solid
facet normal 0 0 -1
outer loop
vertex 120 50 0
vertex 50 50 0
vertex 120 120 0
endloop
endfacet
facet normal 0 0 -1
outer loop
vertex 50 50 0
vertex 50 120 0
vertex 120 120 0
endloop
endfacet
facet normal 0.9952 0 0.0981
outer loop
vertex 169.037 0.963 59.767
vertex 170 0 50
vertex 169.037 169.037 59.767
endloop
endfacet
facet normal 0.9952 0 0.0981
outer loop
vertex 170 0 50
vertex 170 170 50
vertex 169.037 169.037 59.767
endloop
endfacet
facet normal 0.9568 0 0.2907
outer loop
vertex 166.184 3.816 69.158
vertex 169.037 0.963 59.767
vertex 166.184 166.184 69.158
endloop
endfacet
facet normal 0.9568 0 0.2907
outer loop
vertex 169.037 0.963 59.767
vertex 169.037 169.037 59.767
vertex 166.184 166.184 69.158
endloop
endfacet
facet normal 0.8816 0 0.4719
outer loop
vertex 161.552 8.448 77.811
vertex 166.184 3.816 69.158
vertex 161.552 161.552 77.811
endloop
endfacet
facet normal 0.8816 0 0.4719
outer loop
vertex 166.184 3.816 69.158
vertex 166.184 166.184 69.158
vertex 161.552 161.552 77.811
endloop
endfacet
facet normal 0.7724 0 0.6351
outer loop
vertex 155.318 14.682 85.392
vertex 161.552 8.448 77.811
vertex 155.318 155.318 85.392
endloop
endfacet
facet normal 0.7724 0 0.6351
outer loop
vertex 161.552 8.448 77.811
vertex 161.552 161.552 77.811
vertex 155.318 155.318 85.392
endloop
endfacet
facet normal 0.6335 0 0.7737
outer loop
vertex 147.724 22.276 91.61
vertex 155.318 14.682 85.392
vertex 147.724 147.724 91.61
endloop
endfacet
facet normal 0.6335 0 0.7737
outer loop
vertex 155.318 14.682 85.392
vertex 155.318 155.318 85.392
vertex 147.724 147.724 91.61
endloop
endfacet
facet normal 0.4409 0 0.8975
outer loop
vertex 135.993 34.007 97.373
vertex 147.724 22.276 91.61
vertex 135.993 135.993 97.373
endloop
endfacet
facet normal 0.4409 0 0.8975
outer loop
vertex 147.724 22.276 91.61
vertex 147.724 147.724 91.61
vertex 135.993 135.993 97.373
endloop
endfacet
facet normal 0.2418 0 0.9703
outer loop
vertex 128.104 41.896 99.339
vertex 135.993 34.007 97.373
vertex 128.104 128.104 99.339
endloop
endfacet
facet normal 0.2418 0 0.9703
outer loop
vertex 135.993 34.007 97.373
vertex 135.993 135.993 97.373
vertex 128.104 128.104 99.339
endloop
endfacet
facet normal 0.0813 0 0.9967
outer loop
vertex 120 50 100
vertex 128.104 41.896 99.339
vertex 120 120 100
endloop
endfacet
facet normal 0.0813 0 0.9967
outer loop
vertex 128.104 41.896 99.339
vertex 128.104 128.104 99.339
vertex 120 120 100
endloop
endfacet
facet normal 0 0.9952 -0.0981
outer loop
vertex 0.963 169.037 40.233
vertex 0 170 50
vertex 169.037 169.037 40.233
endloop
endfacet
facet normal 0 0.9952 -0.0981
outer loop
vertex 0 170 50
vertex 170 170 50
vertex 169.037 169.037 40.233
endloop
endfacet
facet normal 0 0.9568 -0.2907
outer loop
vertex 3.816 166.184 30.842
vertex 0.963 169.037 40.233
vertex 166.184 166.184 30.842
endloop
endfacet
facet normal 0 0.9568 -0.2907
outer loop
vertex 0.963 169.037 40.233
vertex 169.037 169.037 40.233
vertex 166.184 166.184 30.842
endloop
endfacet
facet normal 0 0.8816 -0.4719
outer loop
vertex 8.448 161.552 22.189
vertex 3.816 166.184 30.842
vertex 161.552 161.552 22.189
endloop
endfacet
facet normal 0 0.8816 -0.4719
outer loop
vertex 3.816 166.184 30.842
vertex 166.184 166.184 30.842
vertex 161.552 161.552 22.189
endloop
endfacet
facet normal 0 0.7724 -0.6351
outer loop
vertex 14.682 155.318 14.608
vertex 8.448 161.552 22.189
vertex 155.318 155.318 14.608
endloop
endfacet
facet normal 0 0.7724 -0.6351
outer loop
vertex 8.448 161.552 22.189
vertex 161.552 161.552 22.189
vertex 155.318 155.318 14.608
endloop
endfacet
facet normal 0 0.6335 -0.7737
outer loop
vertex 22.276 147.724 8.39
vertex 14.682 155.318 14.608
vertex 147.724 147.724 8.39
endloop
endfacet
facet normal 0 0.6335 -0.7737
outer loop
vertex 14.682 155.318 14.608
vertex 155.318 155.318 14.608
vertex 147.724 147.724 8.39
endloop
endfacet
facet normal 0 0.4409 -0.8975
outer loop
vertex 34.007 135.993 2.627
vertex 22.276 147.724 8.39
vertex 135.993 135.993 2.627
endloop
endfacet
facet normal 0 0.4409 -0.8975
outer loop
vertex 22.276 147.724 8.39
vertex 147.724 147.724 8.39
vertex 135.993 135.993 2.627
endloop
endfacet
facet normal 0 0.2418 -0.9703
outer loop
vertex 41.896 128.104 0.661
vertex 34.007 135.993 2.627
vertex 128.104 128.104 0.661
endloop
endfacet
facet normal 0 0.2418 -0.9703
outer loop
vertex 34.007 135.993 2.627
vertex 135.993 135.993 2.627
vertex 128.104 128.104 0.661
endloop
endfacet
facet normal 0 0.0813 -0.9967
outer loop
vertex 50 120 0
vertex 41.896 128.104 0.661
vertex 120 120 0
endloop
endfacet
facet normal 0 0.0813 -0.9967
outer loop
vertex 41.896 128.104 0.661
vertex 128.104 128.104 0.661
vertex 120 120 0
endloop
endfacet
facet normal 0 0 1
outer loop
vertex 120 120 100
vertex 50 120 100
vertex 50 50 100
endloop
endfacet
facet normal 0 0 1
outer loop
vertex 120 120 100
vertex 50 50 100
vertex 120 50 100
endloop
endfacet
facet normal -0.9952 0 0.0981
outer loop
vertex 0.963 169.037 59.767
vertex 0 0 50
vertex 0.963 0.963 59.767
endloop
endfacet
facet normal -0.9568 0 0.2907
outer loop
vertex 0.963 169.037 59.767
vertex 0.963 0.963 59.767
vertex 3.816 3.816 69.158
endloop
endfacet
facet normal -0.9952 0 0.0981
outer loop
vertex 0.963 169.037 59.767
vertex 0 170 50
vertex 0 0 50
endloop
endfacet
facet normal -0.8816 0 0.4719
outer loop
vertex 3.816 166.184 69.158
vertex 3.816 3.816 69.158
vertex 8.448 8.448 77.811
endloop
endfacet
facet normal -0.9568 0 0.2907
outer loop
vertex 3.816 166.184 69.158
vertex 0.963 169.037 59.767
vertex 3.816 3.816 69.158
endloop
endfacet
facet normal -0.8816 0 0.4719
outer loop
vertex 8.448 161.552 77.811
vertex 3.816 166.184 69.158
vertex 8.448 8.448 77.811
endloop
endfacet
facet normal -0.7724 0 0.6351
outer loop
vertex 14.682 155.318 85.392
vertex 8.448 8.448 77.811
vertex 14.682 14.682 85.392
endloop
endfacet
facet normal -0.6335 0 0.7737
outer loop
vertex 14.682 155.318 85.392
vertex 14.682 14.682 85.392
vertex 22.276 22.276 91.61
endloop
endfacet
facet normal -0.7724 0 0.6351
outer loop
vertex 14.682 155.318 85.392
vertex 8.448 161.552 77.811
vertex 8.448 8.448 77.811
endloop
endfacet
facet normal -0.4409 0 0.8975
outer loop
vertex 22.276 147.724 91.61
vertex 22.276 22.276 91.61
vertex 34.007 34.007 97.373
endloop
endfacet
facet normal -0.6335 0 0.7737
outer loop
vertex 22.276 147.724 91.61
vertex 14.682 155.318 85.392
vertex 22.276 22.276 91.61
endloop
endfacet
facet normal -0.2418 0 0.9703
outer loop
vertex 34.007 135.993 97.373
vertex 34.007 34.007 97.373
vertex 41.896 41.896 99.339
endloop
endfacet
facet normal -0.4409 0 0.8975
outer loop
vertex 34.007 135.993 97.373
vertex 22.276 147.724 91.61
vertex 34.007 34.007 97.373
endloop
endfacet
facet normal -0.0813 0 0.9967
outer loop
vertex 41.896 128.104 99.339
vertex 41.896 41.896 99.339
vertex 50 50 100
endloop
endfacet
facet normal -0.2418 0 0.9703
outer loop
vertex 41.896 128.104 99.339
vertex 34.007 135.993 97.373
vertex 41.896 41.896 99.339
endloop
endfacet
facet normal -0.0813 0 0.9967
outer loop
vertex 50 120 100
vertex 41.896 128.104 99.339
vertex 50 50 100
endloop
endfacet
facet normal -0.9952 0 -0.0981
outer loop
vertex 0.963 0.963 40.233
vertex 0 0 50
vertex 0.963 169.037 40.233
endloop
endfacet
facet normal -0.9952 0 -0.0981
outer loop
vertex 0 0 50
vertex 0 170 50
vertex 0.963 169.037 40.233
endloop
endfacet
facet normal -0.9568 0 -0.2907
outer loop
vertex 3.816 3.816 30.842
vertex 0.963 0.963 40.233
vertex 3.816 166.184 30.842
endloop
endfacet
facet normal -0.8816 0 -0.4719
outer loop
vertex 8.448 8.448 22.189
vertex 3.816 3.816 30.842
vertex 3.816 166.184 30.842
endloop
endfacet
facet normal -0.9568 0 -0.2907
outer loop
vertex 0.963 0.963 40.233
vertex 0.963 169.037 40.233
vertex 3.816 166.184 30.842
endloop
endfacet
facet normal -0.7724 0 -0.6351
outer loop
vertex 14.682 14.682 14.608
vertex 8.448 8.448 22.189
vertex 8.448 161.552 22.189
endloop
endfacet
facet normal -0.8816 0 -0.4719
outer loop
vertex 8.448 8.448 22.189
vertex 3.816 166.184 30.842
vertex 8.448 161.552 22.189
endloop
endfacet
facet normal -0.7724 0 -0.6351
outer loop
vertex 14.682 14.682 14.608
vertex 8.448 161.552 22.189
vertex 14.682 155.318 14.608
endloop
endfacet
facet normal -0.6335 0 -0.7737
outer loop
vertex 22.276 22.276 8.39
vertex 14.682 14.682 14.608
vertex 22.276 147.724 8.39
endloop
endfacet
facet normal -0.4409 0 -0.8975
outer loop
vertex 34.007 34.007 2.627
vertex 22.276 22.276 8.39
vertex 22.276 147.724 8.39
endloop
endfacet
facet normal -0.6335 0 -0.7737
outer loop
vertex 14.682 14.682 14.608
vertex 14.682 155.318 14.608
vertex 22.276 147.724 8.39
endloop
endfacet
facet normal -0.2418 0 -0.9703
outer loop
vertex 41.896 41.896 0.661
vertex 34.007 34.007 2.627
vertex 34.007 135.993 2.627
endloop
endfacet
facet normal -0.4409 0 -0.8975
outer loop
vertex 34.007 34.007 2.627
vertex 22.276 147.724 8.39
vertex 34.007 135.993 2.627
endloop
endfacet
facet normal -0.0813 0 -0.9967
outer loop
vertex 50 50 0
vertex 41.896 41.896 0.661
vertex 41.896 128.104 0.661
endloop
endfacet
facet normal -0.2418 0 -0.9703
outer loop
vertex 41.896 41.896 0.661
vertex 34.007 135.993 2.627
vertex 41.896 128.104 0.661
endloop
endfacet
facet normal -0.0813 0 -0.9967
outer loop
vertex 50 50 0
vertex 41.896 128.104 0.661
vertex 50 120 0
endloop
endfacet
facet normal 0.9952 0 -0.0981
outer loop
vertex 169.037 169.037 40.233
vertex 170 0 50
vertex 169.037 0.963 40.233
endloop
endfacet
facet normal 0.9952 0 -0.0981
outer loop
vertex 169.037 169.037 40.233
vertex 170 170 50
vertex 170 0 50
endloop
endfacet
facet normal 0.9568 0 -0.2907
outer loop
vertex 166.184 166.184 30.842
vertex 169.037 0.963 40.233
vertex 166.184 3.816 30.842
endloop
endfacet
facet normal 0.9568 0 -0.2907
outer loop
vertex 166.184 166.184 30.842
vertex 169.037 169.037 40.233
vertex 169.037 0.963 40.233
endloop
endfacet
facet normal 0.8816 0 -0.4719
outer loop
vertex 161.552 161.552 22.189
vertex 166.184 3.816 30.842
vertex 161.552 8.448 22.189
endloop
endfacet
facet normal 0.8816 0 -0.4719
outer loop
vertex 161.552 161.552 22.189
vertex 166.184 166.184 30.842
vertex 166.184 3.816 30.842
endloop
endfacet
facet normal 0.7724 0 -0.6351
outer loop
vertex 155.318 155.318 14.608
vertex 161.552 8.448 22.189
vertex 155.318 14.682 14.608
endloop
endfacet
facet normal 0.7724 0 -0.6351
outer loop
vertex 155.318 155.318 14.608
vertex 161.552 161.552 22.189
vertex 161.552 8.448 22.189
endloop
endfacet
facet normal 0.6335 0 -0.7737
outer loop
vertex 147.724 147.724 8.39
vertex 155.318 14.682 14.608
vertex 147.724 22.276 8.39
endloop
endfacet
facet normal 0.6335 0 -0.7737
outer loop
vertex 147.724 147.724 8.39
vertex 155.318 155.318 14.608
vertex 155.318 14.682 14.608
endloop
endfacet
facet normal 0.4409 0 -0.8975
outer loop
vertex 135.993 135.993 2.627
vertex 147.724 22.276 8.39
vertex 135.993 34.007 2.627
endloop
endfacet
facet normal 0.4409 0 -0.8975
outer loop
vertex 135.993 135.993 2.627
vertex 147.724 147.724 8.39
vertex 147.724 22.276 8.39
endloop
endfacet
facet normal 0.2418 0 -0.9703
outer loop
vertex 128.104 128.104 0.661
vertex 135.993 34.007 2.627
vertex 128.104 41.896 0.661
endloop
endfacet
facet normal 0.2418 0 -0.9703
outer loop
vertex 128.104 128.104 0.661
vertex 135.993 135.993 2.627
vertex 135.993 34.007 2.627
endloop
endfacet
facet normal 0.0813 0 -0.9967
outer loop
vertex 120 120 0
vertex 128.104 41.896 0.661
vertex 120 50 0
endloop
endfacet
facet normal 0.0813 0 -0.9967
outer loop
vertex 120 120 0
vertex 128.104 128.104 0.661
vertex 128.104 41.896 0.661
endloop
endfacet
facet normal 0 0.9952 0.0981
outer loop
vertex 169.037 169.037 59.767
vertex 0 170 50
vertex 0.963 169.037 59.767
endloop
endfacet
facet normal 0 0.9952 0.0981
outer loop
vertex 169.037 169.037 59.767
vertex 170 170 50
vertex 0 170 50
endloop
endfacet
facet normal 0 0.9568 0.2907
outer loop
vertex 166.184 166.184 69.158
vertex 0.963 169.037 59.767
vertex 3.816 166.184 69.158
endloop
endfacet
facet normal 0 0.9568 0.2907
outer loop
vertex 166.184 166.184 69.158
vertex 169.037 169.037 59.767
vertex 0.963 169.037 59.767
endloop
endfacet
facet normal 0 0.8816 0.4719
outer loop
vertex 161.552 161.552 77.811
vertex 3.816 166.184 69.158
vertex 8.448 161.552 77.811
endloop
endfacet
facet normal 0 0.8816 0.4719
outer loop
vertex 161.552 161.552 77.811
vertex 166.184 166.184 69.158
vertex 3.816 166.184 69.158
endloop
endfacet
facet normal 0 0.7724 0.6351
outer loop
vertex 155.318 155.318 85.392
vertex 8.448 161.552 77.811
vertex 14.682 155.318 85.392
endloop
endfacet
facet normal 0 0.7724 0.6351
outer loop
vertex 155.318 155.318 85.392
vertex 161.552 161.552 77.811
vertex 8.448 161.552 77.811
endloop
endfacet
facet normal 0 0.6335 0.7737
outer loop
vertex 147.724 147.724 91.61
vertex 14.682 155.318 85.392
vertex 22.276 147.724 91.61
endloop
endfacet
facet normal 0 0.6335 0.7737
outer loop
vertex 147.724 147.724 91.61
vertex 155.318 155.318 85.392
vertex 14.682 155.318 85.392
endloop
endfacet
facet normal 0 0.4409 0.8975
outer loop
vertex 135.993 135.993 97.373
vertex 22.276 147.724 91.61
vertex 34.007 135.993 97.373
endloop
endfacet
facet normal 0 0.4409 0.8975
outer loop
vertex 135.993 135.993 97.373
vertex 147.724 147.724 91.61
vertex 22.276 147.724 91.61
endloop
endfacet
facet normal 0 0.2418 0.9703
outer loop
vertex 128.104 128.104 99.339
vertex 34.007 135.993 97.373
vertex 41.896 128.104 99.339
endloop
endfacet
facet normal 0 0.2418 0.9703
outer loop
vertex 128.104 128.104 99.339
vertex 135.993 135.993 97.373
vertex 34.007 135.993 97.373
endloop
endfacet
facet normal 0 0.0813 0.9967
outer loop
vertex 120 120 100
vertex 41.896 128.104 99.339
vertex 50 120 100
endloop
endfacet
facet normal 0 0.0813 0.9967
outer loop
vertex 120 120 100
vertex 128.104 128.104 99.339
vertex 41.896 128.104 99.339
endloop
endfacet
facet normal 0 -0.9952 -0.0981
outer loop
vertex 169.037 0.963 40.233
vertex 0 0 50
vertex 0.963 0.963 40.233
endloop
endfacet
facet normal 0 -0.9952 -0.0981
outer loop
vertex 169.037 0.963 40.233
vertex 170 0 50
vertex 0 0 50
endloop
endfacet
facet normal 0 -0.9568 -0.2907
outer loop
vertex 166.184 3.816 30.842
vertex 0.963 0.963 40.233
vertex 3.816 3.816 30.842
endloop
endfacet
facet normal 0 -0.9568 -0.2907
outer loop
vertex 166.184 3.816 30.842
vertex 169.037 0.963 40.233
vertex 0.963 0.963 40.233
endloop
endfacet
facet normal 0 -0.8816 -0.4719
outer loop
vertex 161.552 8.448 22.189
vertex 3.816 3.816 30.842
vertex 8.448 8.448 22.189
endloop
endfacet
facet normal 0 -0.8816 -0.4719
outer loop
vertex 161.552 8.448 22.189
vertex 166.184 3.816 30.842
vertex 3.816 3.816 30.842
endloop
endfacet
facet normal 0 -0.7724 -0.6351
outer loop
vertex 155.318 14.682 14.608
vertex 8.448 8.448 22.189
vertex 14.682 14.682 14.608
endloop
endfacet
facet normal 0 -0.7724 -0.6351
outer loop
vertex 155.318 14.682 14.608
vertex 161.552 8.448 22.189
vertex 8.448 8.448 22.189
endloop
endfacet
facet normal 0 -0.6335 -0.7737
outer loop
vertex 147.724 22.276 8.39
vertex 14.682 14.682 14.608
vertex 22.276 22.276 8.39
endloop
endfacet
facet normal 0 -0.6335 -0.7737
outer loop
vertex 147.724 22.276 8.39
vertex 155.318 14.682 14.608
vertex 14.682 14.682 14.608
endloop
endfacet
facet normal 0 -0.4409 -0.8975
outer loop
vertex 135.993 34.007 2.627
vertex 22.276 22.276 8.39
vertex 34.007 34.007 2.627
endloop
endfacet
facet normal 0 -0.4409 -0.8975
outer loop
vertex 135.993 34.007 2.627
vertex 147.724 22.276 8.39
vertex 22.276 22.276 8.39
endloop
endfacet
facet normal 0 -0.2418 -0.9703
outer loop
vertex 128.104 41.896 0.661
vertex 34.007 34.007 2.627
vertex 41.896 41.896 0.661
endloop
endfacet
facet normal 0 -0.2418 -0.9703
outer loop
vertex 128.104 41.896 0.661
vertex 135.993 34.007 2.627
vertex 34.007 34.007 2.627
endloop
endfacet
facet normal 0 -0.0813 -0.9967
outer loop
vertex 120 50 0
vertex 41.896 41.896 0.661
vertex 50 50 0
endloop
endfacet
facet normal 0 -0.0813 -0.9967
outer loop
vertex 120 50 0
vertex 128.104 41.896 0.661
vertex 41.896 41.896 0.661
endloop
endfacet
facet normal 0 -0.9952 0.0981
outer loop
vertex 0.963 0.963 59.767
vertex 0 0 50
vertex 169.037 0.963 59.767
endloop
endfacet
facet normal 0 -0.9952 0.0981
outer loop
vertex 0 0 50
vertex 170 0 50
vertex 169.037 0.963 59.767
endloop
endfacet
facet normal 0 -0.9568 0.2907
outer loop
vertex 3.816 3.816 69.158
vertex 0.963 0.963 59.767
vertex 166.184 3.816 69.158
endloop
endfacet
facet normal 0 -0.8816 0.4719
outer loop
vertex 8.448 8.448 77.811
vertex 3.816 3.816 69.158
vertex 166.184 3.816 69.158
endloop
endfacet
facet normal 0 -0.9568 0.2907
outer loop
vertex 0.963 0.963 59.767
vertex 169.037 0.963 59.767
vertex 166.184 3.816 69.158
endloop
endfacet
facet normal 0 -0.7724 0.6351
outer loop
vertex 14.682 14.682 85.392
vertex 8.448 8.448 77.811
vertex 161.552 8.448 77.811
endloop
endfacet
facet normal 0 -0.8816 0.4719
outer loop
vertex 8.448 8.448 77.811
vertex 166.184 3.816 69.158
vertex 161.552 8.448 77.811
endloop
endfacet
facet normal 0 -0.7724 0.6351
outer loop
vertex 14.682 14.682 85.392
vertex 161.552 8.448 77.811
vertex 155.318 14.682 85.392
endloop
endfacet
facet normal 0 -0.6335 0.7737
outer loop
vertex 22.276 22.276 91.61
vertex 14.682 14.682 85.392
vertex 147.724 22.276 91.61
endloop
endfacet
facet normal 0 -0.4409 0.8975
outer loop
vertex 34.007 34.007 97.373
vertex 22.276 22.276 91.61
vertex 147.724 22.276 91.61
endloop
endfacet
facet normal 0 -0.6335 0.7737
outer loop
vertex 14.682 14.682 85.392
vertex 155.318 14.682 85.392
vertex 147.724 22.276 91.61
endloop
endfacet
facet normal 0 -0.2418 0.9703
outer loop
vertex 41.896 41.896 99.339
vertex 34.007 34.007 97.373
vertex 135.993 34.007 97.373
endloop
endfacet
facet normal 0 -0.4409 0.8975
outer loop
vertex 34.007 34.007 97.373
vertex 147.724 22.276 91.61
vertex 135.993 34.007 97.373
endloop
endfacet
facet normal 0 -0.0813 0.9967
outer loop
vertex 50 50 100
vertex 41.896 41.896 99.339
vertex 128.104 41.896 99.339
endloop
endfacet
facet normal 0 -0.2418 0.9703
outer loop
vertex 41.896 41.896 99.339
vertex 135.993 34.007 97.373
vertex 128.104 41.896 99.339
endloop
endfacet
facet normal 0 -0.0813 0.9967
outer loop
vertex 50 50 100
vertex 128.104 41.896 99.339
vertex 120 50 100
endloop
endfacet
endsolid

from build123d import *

# Parameters (mm, degrees)
SKETCH1_W           = 170
SKETCH1_H           = 170
BOSS_EXTRUDE1_DEPTH = 100
FILLET1_R           = 50


with BuildPart() as part:
    # Sketch1 → Boss-Extrude1 (new body)
    with BuildSketch(Plane.XY):
        with Locations((85, 85)):
            Rectangle(SKETCH1_W, SKETCH1_H)
    extrude(amount=BOSS_EXTRUDE1_DEPTH)

    # Fillet1
    fillet1_edges = [part.edges().sort_by_distance(p)[0] for p in [
        (85, 0, 0),
        (170, 85, 0),
        (85, 170, 0),
        (0, 85, 0),
        (85, 170, 100),
        (170, 85, 100),
        (85, 0, 100),
        (0, 85, 100),
    ]]
    fillet(fillet1_edges, radius=FILLET1_R - 0.0001)  # a hair under: the kernel refuses the full size


solid = part.part
